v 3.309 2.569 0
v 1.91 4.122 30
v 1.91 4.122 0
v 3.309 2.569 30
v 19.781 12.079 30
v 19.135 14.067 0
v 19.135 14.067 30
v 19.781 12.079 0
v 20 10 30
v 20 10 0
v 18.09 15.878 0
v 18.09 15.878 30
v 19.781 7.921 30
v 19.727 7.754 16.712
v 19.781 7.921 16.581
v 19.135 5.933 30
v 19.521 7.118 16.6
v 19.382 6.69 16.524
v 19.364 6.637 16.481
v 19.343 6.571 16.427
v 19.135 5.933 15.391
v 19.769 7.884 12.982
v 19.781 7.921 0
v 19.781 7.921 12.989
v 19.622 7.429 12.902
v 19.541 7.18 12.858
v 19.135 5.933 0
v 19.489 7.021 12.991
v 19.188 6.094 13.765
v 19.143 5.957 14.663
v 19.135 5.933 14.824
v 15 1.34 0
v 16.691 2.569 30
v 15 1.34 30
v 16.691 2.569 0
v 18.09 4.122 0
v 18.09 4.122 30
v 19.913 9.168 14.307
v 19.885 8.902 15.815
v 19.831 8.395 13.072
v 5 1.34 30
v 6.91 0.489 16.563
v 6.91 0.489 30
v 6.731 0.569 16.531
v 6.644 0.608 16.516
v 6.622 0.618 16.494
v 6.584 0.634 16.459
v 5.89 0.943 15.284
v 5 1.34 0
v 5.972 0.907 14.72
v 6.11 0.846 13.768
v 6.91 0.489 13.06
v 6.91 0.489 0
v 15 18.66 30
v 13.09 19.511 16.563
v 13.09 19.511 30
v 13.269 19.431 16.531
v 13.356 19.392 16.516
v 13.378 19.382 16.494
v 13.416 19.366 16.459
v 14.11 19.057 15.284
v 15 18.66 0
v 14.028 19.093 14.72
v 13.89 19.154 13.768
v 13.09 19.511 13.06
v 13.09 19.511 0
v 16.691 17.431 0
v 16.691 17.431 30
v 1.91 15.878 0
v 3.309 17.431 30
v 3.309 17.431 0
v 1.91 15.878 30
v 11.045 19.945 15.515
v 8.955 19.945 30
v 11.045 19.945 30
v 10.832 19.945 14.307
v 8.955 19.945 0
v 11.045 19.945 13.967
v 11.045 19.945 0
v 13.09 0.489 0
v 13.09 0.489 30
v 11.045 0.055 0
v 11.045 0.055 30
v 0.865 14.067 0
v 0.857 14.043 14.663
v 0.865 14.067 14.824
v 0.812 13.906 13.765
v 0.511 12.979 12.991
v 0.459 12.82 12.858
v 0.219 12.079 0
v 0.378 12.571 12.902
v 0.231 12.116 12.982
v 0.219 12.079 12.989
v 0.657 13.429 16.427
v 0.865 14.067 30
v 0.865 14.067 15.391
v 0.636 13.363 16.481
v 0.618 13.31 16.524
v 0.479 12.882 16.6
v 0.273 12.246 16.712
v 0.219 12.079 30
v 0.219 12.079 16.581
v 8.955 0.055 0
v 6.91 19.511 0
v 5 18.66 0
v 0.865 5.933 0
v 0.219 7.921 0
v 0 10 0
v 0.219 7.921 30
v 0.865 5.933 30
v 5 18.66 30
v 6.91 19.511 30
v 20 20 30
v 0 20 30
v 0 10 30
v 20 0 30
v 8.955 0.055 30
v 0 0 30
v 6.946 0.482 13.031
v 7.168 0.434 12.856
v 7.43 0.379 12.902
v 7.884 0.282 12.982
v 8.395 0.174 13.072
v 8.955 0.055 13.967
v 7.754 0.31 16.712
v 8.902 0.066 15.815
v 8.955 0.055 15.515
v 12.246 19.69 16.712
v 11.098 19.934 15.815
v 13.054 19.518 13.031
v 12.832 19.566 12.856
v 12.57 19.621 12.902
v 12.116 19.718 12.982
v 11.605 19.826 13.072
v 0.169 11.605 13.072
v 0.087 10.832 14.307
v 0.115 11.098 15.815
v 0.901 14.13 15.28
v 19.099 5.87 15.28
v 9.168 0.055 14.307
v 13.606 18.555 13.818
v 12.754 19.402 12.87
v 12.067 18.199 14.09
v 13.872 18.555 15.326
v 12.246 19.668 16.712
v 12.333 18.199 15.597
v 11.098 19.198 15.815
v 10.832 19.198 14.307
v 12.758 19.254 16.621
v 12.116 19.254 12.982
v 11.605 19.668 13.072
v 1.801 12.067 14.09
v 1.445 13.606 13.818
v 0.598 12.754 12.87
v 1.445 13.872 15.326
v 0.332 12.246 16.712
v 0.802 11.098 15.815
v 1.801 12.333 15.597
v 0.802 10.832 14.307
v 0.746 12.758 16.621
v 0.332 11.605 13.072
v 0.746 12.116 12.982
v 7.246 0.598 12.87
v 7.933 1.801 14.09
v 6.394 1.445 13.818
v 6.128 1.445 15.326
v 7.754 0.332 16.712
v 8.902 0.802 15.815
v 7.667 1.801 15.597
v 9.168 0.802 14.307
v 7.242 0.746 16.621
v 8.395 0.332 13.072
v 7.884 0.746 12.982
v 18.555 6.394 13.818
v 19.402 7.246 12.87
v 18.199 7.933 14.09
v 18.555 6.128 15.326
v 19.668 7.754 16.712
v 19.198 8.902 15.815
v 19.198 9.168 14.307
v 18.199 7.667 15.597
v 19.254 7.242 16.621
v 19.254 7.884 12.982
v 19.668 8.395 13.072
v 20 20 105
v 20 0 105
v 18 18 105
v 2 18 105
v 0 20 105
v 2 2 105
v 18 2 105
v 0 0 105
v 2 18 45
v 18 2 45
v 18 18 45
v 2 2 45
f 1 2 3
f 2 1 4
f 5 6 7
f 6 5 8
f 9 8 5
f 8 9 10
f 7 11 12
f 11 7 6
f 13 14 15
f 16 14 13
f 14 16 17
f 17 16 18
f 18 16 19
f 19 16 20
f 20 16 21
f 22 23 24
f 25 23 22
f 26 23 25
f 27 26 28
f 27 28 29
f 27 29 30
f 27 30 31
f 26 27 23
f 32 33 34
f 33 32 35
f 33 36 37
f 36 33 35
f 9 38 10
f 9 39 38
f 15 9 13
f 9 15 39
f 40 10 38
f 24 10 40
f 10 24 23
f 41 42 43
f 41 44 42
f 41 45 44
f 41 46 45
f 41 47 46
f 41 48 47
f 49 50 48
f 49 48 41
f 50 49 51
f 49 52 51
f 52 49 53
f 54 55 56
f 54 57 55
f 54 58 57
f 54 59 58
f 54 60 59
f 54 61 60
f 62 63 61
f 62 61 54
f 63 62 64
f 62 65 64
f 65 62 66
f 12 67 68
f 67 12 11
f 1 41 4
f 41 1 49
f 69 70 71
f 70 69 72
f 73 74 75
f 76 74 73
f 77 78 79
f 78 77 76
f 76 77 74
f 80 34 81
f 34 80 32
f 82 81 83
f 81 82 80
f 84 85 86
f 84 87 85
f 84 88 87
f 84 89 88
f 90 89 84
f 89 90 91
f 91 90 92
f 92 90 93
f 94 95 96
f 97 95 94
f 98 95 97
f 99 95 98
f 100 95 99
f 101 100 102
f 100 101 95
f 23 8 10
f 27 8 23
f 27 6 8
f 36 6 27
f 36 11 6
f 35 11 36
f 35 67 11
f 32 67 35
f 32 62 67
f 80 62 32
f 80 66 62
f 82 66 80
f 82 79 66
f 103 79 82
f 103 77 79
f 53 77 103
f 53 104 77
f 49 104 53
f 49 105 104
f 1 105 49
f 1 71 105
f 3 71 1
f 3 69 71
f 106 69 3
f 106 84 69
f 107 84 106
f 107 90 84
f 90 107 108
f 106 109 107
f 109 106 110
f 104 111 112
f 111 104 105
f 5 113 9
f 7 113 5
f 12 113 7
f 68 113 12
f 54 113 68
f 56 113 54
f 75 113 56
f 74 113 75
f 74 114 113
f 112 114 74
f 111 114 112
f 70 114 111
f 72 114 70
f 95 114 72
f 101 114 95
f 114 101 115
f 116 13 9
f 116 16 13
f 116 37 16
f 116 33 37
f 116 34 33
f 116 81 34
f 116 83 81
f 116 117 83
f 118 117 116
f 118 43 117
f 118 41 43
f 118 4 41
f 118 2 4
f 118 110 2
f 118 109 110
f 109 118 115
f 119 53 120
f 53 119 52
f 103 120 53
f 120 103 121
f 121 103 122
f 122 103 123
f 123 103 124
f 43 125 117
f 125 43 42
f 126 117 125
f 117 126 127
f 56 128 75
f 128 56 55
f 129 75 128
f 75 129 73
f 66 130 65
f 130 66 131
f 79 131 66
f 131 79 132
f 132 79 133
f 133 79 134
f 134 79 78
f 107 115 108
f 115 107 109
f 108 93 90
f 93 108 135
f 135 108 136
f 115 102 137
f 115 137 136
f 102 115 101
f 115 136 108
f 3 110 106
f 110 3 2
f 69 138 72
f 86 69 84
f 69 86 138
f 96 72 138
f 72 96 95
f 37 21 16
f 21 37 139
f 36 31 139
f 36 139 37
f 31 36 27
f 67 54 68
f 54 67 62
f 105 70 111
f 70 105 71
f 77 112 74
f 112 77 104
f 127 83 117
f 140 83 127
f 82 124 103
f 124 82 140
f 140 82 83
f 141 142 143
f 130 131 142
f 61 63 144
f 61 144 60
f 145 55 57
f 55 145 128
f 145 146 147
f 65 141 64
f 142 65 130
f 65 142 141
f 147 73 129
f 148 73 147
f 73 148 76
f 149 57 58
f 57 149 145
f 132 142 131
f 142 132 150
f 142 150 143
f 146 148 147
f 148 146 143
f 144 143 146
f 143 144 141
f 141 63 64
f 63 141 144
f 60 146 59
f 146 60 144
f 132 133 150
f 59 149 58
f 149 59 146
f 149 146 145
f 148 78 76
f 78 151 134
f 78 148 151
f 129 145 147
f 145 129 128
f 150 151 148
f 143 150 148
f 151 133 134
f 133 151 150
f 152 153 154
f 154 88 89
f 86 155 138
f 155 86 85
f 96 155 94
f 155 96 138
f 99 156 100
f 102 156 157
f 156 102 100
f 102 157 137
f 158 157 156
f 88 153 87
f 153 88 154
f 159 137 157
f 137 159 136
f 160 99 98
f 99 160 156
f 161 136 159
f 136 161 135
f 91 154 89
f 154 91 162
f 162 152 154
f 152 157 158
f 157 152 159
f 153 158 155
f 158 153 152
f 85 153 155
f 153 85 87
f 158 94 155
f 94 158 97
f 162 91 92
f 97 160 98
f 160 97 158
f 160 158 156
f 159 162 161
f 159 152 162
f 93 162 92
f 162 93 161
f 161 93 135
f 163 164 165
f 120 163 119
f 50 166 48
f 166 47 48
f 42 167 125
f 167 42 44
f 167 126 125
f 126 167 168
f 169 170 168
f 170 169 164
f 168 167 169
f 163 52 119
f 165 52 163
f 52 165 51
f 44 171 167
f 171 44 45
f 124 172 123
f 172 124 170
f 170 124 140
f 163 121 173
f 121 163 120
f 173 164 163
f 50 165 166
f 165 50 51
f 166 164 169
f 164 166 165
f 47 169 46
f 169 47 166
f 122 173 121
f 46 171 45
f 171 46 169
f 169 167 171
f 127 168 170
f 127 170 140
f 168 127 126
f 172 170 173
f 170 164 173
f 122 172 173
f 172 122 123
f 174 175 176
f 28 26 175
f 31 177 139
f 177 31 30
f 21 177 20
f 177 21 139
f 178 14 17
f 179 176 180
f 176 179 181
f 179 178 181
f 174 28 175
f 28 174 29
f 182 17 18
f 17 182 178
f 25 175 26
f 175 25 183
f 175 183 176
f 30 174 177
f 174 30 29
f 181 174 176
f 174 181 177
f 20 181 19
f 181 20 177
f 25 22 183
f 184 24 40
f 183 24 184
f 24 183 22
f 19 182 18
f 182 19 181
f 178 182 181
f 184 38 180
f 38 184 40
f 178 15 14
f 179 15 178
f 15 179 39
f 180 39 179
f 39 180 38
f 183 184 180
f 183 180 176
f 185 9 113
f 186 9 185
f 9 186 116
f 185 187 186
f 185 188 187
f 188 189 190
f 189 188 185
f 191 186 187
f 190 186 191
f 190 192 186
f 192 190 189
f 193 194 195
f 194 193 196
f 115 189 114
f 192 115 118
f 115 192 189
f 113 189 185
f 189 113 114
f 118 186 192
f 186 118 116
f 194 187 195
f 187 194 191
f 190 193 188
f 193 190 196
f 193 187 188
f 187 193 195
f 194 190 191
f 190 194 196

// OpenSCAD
union()  {
translate([10.0,10.0,0.0])scale([1.0,1.0,1.0])rotate([0.0,0.0,0.0])  difference()  {
cylinder(r=10.0,h=30.0);
rotate([0.0,10.0,0.0])  translate([0.0,10.0,15.0])sphere(r = 2.0);
rotate([0.0,10.0,90.0])  translate([0.0,10.0,15.0])sphere(r = 2.0);
rotate([0.0,10.0,180.0])  translate([0.0,10.0,15.0])sphere(r = 2.0);
rotate([0.0,10.0,270.0])  translate([0.0,10.0,15.0])sphere(r = 2.0);
}
translate([0.0,0.0,30.0])cube([20.0,20.0,15.0]);
translate([0.0,0.0,45.0])scale([1.0,1.0,1.0])difference()  {
cube([20.0,20.0,60.0]);
translate([2.0,2.0,0.0])cube([16.0,16.0,60.0]);
}
}
